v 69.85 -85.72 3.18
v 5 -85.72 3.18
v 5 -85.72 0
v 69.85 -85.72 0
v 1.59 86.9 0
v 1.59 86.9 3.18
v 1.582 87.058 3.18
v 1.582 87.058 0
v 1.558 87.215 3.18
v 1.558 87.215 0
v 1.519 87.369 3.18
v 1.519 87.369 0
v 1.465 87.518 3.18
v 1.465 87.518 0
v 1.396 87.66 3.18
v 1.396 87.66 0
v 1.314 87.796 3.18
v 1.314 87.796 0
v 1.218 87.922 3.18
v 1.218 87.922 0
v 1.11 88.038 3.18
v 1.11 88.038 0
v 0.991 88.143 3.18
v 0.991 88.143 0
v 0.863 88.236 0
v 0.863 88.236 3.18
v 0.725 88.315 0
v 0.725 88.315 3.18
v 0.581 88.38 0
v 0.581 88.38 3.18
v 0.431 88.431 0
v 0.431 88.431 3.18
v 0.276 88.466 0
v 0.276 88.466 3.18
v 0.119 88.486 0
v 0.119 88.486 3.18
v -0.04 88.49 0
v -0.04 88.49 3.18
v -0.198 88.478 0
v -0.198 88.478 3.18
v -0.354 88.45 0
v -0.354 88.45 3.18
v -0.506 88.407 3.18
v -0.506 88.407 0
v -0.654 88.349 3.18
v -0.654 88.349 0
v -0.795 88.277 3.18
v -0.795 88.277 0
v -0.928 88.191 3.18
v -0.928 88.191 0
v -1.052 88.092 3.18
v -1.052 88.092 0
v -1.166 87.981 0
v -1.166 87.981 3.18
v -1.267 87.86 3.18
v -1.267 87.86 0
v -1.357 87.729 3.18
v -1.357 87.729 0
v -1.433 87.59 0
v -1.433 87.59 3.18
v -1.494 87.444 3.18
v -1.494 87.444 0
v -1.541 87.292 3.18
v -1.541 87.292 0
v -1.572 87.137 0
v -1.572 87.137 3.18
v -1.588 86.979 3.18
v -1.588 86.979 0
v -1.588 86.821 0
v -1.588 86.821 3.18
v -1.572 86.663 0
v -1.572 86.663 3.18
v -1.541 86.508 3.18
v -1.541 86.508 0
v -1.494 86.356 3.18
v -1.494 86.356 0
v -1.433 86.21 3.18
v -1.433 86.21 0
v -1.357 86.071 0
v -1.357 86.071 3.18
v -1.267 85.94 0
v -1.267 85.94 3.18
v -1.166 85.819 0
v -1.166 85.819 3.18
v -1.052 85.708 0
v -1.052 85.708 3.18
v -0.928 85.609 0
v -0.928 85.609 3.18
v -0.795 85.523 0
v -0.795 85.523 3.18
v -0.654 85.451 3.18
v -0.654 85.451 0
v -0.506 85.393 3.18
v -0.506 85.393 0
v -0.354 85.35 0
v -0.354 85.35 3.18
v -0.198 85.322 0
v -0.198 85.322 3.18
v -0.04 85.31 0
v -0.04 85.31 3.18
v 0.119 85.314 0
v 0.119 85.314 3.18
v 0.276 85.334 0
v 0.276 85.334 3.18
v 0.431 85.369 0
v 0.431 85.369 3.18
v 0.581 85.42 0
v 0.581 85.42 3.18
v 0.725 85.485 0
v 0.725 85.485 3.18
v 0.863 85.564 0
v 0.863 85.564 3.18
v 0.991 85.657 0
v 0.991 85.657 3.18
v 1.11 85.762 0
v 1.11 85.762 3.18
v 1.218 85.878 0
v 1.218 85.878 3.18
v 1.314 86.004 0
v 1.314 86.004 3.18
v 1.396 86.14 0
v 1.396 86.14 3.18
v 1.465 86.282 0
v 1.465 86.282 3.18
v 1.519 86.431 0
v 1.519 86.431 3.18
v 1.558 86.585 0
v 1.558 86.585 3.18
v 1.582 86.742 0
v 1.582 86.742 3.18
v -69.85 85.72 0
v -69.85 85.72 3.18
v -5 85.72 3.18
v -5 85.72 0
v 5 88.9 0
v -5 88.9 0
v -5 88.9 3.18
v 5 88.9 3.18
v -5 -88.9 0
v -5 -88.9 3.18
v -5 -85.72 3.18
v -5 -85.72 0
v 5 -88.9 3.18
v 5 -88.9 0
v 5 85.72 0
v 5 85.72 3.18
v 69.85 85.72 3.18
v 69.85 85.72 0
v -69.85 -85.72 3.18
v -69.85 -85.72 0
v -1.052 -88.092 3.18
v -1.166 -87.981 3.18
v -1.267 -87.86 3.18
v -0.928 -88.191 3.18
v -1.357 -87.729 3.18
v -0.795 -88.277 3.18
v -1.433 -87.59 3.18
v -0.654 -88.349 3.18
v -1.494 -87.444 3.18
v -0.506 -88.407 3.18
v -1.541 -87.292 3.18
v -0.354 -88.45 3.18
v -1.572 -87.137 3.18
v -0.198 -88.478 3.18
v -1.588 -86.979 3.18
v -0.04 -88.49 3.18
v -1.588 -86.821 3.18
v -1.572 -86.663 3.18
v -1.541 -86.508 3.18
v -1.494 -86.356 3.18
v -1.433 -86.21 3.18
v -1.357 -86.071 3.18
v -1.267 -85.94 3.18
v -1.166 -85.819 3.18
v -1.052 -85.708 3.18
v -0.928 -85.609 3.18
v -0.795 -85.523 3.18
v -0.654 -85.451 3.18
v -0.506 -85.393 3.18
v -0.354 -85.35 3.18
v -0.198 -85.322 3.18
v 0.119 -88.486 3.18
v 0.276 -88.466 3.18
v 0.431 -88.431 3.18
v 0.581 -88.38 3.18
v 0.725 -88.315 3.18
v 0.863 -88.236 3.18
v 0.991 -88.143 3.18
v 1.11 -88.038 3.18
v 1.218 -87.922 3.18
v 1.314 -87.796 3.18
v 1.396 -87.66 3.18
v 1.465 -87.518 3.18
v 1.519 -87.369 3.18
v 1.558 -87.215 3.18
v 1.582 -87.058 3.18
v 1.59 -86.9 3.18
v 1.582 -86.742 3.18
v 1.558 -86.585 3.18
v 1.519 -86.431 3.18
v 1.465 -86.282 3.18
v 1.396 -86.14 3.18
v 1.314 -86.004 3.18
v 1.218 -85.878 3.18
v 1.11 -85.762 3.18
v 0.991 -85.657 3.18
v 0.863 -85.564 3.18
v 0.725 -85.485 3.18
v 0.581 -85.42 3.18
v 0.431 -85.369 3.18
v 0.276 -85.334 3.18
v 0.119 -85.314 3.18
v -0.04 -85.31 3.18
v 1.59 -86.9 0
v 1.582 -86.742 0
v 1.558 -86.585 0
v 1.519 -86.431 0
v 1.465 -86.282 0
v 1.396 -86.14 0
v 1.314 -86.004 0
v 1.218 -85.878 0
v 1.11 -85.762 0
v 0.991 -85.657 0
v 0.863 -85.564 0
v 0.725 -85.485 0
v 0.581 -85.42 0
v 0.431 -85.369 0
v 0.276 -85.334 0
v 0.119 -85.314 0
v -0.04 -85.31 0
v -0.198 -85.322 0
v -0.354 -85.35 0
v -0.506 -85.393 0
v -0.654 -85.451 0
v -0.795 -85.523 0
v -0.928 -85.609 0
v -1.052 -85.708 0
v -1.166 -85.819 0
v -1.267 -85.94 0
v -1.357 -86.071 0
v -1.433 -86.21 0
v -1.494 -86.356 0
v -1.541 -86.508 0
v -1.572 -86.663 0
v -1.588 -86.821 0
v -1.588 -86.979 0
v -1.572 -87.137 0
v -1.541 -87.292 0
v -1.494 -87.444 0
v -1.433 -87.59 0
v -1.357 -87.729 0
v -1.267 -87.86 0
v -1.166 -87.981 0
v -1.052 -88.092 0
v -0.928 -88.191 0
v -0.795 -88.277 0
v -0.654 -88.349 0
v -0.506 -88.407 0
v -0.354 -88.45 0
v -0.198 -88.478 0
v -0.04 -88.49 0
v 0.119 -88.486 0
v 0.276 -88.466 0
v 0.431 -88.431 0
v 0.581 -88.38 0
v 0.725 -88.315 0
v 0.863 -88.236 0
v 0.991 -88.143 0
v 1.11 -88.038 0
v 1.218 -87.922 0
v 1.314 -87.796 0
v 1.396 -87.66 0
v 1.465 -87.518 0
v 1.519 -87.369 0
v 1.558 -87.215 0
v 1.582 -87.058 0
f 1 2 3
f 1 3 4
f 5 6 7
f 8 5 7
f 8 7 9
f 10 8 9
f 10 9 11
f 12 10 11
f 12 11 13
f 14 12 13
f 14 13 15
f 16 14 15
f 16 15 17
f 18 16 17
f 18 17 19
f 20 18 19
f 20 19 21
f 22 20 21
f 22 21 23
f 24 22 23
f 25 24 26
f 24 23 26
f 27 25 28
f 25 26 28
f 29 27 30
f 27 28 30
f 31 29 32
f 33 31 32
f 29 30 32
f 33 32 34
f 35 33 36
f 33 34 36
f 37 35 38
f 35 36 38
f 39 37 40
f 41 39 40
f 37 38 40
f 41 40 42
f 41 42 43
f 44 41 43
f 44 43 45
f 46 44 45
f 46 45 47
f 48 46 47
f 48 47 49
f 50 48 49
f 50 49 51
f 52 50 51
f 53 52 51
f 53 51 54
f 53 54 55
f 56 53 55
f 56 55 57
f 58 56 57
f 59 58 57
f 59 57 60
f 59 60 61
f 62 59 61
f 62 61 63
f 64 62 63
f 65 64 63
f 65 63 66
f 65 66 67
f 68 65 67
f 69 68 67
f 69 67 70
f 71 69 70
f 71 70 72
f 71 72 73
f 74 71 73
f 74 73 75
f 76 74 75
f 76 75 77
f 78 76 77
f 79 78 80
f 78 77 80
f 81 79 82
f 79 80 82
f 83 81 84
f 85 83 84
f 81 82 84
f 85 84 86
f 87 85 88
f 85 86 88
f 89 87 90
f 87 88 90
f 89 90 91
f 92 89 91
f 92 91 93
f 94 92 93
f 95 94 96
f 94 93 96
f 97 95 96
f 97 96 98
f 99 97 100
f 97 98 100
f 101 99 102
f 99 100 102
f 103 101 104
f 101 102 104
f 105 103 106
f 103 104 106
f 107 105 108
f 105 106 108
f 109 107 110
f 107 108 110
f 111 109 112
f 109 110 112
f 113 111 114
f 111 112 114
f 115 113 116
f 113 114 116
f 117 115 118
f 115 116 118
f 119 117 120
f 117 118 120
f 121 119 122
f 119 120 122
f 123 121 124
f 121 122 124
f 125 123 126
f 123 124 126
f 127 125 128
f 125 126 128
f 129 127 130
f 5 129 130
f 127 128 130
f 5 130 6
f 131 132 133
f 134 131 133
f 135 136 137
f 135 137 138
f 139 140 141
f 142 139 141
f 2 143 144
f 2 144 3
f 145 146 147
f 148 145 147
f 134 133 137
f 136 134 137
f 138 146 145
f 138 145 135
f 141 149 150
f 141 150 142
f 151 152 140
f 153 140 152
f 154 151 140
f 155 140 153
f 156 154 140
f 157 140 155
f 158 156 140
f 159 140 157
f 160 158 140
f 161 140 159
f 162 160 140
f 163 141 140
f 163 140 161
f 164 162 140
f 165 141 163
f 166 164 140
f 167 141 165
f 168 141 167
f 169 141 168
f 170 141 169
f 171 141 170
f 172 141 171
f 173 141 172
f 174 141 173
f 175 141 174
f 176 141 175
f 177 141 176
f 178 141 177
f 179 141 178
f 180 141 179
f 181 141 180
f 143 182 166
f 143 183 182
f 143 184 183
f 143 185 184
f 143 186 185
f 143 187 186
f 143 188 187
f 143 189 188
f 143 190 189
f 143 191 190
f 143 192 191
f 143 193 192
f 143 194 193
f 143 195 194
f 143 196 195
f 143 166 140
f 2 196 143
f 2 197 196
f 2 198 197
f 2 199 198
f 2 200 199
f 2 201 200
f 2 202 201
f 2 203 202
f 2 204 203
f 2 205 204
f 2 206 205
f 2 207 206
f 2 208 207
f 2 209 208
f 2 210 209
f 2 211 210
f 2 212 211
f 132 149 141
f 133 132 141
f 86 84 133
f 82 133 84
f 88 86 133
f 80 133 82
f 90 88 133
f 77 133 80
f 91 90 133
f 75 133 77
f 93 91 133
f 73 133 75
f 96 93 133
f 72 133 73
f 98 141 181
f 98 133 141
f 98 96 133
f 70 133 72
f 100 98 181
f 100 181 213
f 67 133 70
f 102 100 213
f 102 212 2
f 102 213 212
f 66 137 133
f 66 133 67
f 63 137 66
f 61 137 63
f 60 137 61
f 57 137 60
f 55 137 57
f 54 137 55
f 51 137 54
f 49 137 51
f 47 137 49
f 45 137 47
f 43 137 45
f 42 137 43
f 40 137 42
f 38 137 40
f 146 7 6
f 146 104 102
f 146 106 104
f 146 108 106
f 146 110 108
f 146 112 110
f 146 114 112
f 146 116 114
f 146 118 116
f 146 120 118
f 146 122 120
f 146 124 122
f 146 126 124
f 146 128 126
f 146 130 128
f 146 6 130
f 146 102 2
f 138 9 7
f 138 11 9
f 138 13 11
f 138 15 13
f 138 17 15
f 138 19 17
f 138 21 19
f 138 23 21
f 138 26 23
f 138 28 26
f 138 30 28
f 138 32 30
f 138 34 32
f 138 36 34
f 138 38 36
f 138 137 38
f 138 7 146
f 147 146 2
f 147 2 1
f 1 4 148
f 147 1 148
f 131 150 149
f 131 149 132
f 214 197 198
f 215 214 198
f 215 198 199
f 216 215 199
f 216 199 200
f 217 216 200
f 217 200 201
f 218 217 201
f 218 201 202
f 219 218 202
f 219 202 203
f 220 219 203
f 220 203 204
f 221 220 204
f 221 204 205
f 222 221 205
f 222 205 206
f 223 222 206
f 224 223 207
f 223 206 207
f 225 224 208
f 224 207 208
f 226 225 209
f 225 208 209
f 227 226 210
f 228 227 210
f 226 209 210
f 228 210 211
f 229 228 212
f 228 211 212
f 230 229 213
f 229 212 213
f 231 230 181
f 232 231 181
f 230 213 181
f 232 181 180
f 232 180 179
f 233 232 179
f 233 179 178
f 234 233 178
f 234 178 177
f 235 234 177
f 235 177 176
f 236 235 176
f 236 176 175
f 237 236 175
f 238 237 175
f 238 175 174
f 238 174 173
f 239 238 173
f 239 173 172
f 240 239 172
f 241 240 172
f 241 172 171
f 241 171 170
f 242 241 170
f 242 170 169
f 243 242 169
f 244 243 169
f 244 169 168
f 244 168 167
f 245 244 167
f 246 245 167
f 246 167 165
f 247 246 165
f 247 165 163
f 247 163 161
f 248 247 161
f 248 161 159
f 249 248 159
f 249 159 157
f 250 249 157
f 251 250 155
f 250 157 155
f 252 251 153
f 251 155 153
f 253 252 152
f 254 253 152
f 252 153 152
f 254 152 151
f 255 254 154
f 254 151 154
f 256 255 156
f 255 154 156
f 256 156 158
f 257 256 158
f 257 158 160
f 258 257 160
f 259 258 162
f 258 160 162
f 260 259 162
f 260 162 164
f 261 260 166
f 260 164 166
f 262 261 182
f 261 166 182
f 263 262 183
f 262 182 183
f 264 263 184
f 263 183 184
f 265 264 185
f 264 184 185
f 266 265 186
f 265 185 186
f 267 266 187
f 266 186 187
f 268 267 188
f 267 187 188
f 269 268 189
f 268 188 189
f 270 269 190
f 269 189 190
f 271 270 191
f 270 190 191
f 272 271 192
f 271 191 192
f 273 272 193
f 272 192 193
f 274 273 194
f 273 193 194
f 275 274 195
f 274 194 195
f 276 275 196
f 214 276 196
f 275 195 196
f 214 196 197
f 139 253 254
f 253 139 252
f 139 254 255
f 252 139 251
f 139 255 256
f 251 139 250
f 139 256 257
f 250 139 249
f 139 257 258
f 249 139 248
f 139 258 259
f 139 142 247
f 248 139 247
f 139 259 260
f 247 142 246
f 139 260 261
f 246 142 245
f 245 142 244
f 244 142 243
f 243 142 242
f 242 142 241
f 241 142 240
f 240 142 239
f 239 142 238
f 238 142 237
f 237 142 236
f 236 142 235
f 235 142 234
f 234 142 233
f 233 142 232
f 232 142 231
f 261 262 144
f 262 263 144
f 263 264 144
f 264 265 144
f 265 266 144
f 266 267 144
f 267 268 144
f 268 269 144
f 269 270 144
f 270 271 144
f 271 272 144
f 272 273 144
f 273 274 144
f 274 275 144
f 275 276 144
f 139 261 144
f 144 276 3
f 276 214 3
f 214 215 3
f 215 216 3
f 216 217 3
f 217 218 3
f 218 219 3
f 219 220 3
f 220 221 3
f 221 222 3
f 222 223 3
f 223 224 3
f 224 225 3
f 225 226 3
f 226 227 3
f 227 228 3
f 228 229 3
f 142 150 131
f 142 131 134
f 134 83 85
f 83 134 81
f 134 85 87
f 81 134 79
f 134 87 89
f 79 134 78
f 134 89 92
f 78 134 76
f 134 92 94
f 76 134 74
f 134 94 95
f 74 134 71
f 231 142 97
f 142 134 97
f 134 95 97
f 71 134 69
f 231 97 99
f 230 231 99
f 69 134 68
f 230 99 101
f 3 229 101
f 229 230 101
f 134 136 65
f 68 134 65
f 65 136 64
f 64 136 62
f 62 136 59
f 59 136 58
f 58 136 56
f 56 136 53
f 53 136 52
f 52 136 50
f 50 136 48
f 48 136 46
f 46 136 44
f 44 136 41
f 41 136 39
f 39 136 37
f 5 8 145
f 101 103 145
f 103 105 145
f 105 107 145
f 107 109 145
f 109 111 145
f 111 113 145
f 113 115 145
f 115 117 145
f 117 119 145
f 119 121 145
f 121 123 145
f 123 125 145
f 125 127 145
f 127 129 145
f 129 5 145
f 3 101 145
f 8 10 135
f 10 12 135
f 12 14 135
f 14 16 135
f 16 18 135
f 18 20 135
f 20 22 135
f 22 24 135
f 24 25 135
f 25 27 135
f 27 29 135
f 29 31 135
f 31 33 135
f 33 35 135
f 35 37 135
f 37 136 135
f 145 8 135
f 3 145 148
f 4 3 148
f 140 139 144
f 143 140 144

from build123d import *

# Parameters (mm, degrees)
SKETCH1_W           = 139.7
SKETCH1_H           = 177.8
BOSS_EXTRUDE1_DEPTH = 3.18
SKETCH3_R           = 1.59
SKETCH3_W           = 64.85
SKETCH3_H           = 3.18
CUT_EXTRUDE2_DEPTH  = 10


with BuildPart() as part:
    # Sketch1 → Boss-Extrude1 (new body)
    with BuildSketch(Plane.XY):
        Rectangle(SKETCH1_W, SKETCH1_H)
    extrude(amount=BOSS_EXTRUDE1_DEPTH)

    # Sketch3 → Cut-Extrude2 (cut)
    with BuildSketch(Plane.XY.offset(3.18)):
        with Locations((0, -86.9)):
            Circle(SKETCH3_R)
        with Locations((0, 86.9)):
            Circle(SKETCH3_R)
        with Locations((-37.425, -87.31)):
            Rectangle(SKETCH3_W, SKETCH3_H)
        with Locations((37.425, -87.31)):
            Rectangle(SKETCH3_W, SKETCH3_H)
        with Locations((-37.425, 87.31)):
            Rectangle(SKETCH3_W, SKETCH3_H)
        with Locations((37.425, 87.31)):
            Rectangle(SKETCH3_W, SKETCH3_H)
    extrude(amount=-CUT_EXTRUDE2_DEPTH, mode=Mode.SUBTRACT)


solid = part.part
